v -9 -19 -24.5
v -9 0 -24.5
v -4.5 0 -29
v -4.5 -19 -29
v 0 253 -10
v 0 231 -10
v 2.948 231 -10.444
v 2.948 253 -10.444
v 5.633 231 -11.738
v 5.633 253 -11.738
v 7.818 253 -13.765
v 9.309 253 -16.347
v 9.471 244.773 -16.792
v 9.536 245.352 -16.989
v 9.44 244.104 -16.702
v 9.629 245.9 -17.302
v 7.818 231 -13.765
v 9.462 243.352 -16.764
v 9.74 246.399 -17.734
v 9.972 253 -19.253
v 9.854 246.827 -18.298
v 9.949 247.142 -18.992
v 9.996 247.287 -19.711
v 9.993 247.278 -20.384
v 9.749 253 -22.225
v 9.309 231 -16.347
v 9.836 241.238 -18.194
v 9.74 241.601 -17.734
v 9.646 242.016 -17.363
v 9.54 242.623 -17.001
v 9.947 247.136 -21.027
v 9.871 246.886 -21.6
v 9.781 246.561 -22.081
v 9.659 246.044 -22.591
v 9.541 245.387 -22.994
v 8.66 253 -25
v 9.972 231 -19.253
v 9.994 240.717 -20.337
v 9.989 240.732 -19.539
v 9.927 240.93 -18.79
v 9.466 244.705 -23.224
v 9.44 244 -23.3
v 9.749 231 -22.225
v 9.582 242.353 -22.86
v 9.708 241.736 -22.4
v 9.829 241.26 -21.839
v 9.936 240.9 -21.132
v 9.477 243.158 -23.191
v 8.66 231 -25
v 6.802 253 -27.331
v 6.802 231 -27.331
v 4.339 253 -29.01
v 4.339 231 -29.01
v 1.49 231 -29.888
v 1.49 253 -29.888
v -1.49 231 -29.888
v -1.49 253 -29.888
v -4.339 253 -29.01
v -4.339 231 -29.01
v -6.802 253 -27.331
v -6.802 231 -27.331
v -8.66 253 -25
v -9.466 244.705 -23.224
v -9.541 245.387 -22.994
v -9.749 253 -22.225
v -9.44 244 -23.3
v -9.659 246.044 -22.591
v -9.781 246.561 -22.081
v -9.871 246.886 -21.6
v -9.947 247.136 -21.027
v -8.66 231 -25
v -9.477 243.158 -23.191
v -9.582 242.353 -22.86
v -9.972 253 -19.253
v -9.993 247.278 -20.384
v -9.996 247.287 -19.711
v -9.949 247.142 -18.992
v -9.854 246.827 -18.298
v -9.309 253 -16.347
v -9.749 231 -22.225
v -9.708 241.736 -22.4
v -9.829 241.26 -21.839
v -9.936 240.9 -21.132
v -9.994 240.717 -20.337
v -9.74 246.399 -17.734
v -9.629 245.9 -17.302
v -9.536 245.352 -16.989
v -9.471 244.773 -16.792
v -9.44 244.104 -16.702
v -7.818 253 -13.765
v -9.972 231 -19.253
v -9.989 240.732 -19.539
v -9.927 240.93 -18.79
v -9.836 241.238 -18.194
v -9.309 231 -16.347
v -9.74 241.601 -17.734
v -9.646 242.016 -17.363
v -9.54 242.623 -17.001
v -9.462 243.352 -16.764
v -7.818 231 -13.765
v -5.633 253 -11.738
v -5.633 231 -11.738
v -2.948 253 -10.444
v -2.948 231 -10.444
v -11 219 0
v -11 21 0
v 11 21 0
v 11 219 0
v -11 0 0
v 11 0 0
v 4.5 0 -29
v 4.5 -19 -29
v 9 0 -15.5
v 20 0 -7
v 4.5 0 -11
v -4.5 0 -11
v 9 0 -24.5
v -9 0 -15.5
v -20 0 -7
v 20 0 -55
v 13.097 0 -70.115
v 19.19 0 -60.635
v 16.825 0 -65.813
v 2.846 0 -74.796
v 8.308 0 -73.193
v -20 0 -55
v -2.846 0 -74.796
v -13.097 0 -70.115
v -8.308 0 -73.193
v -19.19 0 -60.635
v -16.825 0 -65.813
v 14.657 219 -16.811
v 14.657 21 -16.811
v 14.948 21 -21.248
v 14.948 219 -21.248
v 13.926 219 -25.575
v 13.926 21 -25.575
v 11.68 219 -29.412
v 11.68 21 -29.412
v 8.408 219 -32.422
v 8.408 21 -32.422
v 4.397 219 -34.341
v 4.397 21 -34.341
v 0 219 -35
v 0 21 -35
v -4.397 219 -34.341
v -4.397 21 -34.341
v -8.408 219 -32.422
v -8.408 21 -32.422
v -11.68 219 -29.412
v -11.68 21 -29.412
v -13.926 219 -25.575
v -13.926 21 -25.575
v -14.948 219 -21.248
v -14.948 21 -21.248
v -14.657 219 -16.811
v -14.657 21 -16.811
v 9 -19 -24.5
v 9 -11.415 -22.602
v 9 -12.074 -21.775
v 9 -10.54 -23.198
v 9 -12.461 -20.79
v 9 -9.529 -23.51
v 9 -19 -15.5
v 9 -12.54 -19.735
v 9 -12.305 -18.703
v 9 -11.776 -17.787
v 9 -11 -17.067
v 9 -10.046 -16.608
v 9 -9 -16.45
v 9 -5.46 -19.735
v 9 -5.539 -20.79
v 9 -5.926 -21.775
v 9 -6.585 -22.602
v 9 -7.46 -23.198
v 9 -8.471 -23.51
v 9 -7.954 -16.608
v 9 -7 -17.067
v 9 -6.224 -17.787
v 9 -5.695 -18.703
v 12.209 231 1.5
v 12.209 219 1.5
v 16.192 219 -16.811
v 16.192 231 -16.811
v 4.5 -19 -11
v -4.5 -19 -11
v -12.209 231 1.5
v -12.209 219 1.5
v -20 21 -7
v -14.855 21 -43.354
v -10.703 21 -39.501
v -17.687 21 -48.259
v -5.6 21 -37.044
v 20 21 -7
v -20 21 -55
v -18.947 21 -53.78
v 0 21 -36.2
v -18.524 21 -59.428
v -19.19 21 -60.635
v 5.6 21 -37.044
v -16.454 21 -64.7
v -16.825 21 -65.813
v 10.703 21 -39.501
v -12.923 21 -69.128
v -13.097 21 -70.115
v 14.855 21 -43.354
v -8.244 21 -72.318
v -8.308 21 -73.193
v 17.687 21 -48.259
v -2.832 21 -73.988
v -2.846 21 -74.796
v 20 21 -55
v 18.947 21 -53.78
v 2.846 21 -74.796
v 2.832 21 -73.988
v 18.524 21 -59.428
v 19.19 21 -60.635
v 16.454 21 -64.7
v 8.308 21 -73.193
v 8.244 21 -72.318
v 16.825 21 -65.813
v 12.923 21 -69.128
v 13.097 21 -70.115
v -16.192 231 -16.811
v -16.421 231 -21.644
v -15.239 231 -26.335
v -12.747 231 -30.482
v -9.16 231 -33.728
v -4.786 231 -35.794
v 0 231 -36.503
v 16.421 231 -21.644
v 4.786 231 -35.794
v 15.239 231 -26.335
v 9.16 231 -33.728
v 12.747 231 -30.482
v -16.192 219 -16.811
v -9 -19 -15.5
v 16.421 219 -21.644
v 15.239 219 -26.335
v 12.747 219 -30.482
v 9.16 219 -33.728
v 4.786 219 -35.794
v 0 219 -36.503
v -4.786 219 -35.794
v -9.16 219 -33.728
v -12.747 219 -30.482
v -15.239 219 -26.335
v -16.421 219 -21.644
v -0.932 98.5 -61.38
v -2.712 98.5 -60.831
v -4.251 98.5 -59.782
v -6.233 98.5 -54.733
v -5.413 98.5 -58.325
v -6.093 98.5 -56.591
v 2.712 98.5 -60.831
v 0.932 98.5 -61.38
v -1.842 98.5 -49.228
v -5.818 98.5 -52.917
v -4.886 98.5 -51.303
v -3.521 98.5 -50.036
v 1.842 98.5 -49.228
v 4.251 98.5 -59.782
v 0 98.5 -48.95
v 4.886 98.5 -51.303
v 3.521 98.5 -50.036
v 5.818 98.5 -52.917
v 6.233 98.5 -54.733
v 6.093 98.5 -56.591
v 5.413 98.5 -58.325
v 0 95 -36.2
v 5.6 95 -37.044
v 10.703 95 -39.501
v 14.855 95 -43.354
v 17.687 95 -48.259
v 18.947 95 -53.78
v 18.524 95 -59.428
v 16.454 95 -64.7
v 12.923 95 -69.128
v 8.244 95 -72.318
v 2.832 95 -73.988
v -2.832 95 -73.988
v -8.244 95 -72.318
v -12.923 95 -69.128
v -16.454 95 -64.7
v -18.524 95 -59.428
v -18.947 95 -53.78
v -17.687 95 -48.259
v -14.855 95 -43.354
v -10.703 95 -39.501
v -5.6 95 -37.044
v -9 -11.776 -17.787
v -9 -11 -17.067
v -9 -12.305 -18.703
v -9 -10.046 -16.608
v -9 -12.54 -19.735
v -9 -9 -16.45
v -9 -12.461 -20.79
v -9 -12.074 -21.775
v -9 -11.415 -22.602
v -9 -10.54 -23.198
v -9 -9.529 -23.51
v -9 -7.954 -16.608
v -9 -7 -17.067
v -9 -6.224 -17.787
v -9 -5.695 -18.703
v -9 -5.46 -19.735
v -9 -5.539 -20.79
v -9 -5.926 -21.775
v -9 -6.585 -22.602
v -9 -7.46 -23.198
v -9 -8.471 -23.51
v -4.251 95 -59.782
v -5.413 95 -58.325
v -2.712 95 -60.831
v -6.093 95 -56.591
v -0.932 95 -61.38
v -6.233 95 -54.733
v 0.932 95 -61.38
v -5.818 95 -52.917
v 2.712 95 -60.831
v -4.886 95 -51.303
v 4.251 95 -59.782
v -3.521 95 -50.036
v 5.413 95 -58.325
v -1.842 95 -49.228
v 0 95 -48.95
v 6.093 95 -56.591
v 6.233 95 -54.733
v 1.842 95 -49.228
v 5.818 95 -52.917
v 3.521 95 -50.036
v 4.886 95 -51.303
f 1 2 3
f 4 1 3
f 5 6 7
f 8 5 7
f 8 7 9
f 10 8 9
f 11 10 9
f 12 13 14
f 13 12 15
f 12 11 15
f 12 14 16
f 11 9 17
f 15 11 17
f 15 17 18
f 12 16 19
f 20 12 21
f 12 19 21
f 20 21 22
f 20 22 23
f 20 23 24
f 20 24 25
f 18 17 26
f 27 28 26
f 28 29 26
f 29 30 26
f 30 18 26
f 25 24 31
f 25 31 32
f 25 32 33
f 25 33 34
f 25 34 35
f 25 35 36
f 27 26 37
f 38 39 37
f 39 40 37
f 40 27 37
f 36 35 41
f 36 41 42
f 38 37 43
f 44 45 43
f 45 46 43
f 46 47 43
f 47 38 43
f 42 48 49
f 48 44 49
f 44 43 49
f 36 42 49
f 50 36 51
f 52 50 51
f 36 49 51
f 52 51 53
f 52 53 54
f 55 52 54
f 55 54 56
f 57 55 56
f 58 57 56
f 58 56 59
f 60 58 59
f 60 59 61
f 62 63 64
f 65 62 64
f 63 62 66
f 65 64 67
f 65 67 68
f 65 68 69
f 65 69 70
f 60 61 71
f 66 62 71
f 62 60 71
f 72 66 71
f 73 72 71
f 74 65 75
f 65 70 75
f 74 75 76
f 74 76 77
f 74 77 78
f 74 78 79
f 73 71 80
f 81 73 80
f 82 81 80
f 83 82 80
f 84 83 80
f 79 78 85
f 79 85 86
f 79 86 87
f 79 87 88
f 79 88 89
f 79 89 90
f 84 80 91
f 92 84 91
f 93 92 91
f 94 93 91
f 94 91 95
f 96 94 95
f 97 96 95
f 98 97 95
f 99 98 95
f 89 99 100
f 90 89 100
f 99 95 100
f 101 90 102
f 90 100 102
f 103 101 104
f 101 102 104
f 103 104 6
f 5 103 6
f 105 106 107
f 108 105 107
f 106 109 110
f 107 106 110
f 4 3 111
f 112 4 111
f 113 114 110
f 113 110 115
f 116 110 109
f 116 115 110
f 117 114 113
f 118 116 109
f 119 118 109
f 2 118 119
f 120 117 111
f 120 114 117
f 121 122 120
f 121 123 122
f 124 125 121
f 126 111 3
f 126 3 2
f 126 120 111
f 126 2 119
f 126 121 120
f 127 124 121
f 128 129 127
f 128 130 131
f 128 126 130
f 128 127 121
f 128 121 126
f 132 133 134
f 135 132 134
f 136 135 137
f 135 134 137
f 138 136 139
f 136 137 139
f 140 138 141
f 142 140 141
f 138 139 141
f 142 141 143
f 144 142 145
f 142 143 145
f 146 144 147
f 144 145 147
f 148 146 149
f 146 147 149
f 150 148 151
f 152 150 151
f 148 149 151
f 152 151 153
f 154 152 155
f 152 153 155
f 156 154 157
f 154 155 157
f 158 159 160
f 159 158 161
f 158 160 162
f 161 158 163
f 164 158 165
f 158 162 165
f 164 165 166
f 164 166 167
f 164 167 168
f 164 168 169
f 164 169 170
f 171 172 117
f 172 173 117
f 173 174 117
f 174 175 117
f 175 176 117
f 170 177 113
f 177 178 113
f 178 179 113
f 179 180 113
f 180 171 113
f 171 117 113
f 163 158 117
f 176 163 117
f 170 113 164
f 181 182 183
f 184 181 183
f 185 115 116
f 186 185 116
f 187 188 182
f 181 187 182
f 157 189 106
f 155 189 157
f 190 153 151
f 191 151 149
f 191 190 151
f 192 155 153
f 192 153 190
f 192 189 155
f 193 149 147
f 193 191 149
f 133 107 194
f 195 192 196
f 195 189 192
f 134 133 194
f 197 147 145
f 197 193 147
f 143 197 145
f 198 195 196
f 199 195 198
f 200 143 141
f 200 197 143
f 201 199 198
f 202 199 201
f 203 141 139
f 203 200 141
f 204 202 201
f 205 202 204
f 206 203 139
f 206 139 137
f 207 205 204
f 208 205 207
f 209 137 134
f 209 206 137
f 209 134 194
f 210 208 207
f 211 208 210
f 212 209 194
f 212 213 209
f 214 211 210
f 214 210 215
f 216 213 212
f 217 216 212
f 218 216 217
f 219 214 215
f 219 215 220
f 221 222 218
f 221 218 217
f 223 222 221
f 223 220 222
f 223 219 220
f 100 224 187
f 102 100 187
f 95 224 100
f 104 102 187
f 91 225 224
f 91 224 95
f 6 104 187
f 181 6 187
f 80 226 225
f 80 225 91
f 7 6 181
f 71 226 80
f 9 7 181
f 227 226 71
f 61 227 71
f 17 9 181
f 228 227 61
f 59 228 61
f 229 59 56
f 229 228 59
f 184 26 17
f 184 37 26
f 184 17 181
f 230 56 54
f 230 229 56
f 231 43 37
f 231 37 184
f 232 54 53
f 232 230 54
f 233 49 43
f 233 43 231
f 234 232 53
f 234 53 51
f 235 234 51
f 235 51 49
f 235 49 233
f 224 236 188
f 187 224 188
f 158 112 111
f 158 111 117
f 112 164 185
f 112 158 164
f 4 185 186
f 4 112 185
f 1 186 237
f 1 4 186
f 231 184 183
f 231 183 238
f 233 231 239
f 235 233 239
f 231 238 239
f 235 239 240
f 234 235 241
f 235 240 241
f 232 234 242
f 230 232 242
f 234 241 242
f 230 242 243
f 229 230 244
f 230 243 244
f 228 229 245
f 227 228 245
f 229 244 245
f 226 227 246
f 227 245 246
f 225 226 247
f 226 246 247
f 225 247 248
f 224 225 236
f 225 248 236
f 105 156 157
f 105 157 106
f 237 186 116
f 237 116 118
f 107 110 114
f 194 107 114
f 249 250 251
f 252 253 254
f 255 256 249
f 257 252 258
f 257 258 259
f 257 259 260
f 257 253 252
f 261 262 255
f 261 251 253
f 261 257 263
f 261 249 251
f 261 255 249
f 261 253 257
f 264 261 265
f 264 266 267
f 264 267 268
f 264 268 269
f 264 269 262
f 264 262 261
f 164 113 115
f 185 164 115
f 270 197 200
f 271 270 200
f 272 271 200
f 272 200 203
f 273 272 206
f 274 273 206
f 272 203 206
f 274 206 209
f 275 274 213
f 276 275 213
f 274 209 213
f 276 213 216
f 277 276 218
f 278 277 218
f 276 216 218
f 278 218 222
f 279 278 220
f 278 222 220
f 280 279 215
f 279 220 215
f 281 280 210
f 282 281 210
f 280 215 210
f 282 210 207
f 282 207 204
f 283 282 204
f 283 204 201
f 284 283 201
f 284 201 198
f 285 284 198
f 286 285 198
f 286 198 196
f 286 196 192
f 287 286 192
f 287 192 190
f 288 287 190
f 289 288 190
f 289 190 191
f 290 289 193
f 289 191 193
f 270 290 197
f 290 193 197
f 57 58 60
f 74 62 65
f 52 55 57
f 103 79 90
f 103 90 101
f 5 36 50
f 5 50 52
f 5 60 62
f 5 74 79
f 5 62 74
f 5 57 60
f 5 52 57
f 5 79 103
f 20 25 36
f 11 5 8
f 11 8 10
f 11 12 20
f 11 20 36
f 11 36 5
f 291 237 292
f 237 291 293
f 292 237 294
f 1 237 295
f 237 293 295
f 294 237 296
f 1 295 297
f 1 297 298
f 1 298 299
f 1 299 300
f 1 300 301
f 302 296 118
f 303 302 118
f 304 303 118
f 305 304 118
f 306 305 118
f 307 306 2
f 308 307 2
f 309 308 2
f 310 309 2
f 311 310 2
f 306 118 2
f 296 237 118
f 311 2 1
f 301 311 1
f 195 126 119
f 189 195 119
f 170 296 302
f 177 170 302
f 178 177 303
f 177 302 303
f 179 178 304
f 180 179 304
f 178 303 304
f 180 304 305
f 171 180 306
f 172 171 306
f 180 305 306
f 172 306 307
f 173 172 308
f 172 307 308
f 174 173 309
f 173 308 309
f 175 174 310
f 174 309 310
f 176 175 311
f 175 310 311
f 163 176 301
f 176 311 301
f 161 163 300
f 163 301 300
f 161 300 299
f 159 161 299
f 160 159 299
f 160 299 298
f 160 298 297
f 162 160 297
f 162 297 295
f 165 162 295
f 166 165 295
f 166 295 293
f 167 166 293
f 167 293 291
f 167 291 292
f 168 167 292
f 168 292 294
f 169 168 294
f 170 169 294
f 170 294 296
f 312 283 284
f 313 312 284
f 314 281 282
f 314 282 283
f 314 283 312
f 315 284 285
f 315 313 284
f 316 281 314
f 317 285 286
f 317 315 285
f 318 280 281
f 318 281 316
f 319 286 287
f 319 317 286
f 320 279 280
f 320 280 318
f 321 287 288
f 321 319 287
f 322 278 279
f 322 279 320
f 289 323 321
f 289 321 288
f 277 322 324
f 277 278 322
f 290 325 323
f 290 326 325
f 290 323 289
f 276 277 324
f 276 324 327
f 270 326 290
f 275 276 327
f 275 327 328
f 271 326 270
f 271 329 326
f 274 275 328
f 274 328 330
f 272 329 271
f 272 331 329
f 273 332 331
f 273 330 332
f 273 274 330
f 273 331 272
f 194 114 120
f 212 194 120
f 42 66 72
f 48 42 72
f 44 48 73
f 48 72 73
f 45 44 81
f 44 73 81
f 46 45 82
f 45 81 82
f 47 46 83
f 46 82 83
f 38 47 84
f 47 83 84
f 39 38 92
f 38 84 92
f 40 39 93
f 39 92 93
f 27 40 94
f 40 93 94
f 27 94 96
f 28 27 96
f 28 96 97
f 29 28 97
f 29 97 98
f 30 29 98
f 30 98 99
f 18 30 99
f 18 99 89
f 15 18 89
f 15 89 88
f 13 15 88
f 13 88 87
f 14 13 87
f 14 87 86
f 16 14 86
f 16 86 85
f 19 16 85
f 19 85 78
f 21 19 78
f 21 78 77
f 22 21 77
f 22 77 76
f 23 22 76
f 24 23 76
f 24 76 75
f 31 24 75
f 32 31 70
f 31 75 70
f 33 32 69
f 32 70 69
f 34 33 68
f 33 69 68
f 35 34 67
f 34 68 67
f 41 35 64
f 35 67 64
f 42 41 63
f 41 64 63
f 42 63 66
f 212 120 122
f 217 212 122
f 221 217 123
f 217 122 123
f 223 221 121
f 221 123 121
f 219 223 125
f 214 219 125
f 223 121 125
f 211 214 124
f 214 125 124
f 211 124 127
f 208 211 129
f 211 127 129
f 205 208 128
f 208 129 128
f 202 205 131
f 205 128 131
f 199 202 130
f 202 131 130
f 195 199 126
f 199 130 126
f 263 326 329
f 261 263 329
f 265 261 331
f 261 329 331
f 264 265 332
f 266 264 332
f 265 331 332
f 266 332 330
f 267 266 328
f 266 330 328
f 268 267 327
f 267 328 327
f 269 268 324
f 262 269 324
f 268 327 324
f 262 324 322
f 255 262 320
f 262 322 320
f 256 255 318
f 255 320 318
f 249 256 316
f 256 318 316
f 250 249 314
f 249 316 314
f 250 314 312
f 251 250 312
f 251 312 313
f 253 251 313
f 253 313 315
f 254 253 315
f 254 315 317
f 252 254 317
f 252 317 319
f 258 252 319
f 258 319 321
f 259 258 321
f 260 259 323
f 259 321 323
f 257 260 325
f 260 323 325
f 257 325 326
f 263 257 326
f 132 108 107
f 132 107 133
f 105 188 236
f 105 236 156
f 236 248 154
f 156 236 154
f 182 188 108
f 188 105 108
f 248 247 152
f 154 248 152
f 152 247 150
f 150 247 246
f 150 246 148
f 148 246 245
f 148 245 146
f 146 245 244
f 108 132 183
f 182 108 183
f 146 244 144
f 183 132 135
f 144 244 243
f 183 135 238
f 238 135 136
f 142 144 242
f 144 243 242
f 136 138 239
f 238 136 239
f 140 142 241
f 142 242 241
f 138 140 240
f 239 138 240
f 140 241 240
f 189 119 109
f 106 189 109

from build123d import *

# Parameters (mm, degrees)
ESTRUSIONE_ESTRUSIONE1_DEPTH = 21
ESTRUSIONE_ESTRUSIONE2_DEPTH = 19
FORO_PER_VITE_M6_5_1_D       = 7.1
FORO_PER_VITE_M6_5_1_DEPTH   = 80
FORO_PER_VITE_M6_5_1_TIP     = 2.133055198
SCHIZZO5_R                   = 19
ESTRUSIONE_ESTRUSIONE3_DEPTH = 74
SCHIZZO7_R                   = 6.25
ESTRUSIONE_ESTRUSIONE4_DEPTH = 3.5
ESTRUSIONE_ESTRUSIONE5_DEPTH = 198
ESTRUSIONE_ESTRUSIONE6_DEPTH = 12
SCHIZZO10_R                  = 10
ESTRUSIONE_ESTRUSIONE7_DEPTH = 22
FORO_PER_VITE_M6_1_D         = 6.6
FORO_PER_VITE_M6_1_DEPTH     = 80
FORO_PER_VITE_M6_1_TIP       = 1.982840043


with BuildPart() as part:
    # Schizzo1 → Estrusione-Estrusione1 (new body)
    with BuildSketch(Plane(origin=(0, 0, 0), x_dir=(1, 0, 0), z_dir=(0, 1, 0))):
        with BuildLine():
            Line((-20, 7), (-11, 0))
            Line((-11, 0), (11, 0))
            Line((11, 0), (20, 7))
            Line((20, 7), (20, 55))
            ThreePointArc((20, 55), (0, 75), (-20, 55))
            Line((-20, 55), (-20, 7))
        make_face()
    extrude(amount=ESTRUSIONE_ESTRUSIONE1_DEPTH)

    # Schizzo1<3> → Estrusione-Estrusione2 (add)
    with BuildSketch(Plane(origin=(0, 0, 0), x_dir=(1, 0, 0), z_dir=(0, 1, 0))):
        Polygon((-4.5, 11), (4.5, 11), (9, 15.5), (9, 24.5), (4.5, 29), (-4.5, 29), (-9, 24.5), (-9, 15.5), align=None)
    extrude(amount=-ESTRUSIONE_ESTRUSIONE2_DEPTH)

    # Foro per Vite M6.5-1
    with Locations(Plane(origin=(9, 0, 0), x_dir=(0, 0, -1), z_dir=(1, 0, 0))):
        with Locations((20, -9)):
            Hole(FORO_PER_VITE_M6_5_1_D / 2, depth=FORO_PER_VITE_M6_5_1_DEPTH)
            with Locations((0, 0, -(FORO_PER_VITE_M6_5_1_DEPTH + FORO_PER_VITE_M6_5_1_TIP / 2))):  # 118° drill point
                Cone(0, FORO_PER_VITE_M6_5_1_D / 2, FORO_PER_VITE_M6_5_1_TIP, mode=Mode.SUBTRACT)

    # Schizzo5 → Estrusione-Estrusione3 (add)
    with BuildSketch(Plane(origin=(0, 21, 0), x_dir=(1, 0, 0), z_dir=(0, 1, 0))):
        with Locations((0, 55.2)):
            Circle(SCHIZZO5_R)
    extrude(amount=ESTRUSIONE_ESTRUSIONE3_DEPTH)

    # Schizzo7 → Estrusione-Estrusione4 (add)
    with BuildSketch(Plane(origin=(0, 95, 0), x_dir=(1, 0, 0), z_dir=(0, 1, 0))):
        with Locations((0, 55.2)):
            Circle(SCHIZZO7_R)
    extrude(amount=ESTRUSIONE_ESTRUSIONE4_DEPTH)

    # Schizzo8 → Estrusione-Estrusione5 (add)
    with BuildSketch(Plane(origin=(0, 21, 0), x_dir=(1, 0, 0), z_dir=(0, 1, 0))):
        with BuildLine():
            Line((-11, 0), (11, 0))
            Line((11, 0), (14.657188407, 16.811453624))
            ThreePointArc((14.657188407, 16.811453624), (0, 35), (-14.657188407, 16.811453624))
            Line((-14.657188407, 16.811453624), (-11, 0))
        make_face()
    extrude(amount=ESTRUSIONE_ESTRUSIONE5_DEPTH)

    # Schizzo9 → Estrusione-Estrusione6 (add)
    with BuildSketch(Plane(origin=(0, 219, 0), x_dir=(1, 0, 0), z_dir=(0, 1, 0))):
        with BuildLine():
            Line((-12.208770737, -1.5), (12.208770737, -1.5))
            Line((12.208770737, -1.5), (16.192271356, 16.811453624))
            ThreePointArc((16.192271356, 16.811453624), (0, 36.503226341), (-16.192271356, 16.811453624))
            Line((-16.192271356, 16.811453624), (-12.208770737, -1.5))
        make_face()
    extrude(amount=ESTRUSIONE_ESTRUSIONE6_DEPTH)

    # Schizzo10 → Estrusione-Estrusione7 (add)
    with BuildSketch(Plane(origin=(0, 231, 0), x_dir=(1, 0, 0), z_dir=(0, 1, 0))):
        with Locations((0, 20)):
            Circle(SCHIZZO10_R)
    extrude(amount=ESTRUSIONE_ESTRUSIONE7_DEPTH)

    # Foro per Vite M6-1
    with Locations(Plane(origin=(10, 244, -20), x_dir=(0, 0, 1), z_dir=(1, 0, 0))):
        with Locations((0, 0)):
            Hole(FORO_PER_VITE_M6_1_D / 2, depth=FORO_PER_VITE_M6_1_DEPTH)
            with Locations((0, 0, -(FORO_PER_VITE_M6_1_DEPTH + FORO_PER_VITE_M6_1_TIP / 2))):  # 118° drill point
                Cone(0, FORO_PER_VITE_M6_1_D / 2, FORO_PER_VITE_M6_1_TIP, mode=Mode.SUBTRACT)


solid = part.part
